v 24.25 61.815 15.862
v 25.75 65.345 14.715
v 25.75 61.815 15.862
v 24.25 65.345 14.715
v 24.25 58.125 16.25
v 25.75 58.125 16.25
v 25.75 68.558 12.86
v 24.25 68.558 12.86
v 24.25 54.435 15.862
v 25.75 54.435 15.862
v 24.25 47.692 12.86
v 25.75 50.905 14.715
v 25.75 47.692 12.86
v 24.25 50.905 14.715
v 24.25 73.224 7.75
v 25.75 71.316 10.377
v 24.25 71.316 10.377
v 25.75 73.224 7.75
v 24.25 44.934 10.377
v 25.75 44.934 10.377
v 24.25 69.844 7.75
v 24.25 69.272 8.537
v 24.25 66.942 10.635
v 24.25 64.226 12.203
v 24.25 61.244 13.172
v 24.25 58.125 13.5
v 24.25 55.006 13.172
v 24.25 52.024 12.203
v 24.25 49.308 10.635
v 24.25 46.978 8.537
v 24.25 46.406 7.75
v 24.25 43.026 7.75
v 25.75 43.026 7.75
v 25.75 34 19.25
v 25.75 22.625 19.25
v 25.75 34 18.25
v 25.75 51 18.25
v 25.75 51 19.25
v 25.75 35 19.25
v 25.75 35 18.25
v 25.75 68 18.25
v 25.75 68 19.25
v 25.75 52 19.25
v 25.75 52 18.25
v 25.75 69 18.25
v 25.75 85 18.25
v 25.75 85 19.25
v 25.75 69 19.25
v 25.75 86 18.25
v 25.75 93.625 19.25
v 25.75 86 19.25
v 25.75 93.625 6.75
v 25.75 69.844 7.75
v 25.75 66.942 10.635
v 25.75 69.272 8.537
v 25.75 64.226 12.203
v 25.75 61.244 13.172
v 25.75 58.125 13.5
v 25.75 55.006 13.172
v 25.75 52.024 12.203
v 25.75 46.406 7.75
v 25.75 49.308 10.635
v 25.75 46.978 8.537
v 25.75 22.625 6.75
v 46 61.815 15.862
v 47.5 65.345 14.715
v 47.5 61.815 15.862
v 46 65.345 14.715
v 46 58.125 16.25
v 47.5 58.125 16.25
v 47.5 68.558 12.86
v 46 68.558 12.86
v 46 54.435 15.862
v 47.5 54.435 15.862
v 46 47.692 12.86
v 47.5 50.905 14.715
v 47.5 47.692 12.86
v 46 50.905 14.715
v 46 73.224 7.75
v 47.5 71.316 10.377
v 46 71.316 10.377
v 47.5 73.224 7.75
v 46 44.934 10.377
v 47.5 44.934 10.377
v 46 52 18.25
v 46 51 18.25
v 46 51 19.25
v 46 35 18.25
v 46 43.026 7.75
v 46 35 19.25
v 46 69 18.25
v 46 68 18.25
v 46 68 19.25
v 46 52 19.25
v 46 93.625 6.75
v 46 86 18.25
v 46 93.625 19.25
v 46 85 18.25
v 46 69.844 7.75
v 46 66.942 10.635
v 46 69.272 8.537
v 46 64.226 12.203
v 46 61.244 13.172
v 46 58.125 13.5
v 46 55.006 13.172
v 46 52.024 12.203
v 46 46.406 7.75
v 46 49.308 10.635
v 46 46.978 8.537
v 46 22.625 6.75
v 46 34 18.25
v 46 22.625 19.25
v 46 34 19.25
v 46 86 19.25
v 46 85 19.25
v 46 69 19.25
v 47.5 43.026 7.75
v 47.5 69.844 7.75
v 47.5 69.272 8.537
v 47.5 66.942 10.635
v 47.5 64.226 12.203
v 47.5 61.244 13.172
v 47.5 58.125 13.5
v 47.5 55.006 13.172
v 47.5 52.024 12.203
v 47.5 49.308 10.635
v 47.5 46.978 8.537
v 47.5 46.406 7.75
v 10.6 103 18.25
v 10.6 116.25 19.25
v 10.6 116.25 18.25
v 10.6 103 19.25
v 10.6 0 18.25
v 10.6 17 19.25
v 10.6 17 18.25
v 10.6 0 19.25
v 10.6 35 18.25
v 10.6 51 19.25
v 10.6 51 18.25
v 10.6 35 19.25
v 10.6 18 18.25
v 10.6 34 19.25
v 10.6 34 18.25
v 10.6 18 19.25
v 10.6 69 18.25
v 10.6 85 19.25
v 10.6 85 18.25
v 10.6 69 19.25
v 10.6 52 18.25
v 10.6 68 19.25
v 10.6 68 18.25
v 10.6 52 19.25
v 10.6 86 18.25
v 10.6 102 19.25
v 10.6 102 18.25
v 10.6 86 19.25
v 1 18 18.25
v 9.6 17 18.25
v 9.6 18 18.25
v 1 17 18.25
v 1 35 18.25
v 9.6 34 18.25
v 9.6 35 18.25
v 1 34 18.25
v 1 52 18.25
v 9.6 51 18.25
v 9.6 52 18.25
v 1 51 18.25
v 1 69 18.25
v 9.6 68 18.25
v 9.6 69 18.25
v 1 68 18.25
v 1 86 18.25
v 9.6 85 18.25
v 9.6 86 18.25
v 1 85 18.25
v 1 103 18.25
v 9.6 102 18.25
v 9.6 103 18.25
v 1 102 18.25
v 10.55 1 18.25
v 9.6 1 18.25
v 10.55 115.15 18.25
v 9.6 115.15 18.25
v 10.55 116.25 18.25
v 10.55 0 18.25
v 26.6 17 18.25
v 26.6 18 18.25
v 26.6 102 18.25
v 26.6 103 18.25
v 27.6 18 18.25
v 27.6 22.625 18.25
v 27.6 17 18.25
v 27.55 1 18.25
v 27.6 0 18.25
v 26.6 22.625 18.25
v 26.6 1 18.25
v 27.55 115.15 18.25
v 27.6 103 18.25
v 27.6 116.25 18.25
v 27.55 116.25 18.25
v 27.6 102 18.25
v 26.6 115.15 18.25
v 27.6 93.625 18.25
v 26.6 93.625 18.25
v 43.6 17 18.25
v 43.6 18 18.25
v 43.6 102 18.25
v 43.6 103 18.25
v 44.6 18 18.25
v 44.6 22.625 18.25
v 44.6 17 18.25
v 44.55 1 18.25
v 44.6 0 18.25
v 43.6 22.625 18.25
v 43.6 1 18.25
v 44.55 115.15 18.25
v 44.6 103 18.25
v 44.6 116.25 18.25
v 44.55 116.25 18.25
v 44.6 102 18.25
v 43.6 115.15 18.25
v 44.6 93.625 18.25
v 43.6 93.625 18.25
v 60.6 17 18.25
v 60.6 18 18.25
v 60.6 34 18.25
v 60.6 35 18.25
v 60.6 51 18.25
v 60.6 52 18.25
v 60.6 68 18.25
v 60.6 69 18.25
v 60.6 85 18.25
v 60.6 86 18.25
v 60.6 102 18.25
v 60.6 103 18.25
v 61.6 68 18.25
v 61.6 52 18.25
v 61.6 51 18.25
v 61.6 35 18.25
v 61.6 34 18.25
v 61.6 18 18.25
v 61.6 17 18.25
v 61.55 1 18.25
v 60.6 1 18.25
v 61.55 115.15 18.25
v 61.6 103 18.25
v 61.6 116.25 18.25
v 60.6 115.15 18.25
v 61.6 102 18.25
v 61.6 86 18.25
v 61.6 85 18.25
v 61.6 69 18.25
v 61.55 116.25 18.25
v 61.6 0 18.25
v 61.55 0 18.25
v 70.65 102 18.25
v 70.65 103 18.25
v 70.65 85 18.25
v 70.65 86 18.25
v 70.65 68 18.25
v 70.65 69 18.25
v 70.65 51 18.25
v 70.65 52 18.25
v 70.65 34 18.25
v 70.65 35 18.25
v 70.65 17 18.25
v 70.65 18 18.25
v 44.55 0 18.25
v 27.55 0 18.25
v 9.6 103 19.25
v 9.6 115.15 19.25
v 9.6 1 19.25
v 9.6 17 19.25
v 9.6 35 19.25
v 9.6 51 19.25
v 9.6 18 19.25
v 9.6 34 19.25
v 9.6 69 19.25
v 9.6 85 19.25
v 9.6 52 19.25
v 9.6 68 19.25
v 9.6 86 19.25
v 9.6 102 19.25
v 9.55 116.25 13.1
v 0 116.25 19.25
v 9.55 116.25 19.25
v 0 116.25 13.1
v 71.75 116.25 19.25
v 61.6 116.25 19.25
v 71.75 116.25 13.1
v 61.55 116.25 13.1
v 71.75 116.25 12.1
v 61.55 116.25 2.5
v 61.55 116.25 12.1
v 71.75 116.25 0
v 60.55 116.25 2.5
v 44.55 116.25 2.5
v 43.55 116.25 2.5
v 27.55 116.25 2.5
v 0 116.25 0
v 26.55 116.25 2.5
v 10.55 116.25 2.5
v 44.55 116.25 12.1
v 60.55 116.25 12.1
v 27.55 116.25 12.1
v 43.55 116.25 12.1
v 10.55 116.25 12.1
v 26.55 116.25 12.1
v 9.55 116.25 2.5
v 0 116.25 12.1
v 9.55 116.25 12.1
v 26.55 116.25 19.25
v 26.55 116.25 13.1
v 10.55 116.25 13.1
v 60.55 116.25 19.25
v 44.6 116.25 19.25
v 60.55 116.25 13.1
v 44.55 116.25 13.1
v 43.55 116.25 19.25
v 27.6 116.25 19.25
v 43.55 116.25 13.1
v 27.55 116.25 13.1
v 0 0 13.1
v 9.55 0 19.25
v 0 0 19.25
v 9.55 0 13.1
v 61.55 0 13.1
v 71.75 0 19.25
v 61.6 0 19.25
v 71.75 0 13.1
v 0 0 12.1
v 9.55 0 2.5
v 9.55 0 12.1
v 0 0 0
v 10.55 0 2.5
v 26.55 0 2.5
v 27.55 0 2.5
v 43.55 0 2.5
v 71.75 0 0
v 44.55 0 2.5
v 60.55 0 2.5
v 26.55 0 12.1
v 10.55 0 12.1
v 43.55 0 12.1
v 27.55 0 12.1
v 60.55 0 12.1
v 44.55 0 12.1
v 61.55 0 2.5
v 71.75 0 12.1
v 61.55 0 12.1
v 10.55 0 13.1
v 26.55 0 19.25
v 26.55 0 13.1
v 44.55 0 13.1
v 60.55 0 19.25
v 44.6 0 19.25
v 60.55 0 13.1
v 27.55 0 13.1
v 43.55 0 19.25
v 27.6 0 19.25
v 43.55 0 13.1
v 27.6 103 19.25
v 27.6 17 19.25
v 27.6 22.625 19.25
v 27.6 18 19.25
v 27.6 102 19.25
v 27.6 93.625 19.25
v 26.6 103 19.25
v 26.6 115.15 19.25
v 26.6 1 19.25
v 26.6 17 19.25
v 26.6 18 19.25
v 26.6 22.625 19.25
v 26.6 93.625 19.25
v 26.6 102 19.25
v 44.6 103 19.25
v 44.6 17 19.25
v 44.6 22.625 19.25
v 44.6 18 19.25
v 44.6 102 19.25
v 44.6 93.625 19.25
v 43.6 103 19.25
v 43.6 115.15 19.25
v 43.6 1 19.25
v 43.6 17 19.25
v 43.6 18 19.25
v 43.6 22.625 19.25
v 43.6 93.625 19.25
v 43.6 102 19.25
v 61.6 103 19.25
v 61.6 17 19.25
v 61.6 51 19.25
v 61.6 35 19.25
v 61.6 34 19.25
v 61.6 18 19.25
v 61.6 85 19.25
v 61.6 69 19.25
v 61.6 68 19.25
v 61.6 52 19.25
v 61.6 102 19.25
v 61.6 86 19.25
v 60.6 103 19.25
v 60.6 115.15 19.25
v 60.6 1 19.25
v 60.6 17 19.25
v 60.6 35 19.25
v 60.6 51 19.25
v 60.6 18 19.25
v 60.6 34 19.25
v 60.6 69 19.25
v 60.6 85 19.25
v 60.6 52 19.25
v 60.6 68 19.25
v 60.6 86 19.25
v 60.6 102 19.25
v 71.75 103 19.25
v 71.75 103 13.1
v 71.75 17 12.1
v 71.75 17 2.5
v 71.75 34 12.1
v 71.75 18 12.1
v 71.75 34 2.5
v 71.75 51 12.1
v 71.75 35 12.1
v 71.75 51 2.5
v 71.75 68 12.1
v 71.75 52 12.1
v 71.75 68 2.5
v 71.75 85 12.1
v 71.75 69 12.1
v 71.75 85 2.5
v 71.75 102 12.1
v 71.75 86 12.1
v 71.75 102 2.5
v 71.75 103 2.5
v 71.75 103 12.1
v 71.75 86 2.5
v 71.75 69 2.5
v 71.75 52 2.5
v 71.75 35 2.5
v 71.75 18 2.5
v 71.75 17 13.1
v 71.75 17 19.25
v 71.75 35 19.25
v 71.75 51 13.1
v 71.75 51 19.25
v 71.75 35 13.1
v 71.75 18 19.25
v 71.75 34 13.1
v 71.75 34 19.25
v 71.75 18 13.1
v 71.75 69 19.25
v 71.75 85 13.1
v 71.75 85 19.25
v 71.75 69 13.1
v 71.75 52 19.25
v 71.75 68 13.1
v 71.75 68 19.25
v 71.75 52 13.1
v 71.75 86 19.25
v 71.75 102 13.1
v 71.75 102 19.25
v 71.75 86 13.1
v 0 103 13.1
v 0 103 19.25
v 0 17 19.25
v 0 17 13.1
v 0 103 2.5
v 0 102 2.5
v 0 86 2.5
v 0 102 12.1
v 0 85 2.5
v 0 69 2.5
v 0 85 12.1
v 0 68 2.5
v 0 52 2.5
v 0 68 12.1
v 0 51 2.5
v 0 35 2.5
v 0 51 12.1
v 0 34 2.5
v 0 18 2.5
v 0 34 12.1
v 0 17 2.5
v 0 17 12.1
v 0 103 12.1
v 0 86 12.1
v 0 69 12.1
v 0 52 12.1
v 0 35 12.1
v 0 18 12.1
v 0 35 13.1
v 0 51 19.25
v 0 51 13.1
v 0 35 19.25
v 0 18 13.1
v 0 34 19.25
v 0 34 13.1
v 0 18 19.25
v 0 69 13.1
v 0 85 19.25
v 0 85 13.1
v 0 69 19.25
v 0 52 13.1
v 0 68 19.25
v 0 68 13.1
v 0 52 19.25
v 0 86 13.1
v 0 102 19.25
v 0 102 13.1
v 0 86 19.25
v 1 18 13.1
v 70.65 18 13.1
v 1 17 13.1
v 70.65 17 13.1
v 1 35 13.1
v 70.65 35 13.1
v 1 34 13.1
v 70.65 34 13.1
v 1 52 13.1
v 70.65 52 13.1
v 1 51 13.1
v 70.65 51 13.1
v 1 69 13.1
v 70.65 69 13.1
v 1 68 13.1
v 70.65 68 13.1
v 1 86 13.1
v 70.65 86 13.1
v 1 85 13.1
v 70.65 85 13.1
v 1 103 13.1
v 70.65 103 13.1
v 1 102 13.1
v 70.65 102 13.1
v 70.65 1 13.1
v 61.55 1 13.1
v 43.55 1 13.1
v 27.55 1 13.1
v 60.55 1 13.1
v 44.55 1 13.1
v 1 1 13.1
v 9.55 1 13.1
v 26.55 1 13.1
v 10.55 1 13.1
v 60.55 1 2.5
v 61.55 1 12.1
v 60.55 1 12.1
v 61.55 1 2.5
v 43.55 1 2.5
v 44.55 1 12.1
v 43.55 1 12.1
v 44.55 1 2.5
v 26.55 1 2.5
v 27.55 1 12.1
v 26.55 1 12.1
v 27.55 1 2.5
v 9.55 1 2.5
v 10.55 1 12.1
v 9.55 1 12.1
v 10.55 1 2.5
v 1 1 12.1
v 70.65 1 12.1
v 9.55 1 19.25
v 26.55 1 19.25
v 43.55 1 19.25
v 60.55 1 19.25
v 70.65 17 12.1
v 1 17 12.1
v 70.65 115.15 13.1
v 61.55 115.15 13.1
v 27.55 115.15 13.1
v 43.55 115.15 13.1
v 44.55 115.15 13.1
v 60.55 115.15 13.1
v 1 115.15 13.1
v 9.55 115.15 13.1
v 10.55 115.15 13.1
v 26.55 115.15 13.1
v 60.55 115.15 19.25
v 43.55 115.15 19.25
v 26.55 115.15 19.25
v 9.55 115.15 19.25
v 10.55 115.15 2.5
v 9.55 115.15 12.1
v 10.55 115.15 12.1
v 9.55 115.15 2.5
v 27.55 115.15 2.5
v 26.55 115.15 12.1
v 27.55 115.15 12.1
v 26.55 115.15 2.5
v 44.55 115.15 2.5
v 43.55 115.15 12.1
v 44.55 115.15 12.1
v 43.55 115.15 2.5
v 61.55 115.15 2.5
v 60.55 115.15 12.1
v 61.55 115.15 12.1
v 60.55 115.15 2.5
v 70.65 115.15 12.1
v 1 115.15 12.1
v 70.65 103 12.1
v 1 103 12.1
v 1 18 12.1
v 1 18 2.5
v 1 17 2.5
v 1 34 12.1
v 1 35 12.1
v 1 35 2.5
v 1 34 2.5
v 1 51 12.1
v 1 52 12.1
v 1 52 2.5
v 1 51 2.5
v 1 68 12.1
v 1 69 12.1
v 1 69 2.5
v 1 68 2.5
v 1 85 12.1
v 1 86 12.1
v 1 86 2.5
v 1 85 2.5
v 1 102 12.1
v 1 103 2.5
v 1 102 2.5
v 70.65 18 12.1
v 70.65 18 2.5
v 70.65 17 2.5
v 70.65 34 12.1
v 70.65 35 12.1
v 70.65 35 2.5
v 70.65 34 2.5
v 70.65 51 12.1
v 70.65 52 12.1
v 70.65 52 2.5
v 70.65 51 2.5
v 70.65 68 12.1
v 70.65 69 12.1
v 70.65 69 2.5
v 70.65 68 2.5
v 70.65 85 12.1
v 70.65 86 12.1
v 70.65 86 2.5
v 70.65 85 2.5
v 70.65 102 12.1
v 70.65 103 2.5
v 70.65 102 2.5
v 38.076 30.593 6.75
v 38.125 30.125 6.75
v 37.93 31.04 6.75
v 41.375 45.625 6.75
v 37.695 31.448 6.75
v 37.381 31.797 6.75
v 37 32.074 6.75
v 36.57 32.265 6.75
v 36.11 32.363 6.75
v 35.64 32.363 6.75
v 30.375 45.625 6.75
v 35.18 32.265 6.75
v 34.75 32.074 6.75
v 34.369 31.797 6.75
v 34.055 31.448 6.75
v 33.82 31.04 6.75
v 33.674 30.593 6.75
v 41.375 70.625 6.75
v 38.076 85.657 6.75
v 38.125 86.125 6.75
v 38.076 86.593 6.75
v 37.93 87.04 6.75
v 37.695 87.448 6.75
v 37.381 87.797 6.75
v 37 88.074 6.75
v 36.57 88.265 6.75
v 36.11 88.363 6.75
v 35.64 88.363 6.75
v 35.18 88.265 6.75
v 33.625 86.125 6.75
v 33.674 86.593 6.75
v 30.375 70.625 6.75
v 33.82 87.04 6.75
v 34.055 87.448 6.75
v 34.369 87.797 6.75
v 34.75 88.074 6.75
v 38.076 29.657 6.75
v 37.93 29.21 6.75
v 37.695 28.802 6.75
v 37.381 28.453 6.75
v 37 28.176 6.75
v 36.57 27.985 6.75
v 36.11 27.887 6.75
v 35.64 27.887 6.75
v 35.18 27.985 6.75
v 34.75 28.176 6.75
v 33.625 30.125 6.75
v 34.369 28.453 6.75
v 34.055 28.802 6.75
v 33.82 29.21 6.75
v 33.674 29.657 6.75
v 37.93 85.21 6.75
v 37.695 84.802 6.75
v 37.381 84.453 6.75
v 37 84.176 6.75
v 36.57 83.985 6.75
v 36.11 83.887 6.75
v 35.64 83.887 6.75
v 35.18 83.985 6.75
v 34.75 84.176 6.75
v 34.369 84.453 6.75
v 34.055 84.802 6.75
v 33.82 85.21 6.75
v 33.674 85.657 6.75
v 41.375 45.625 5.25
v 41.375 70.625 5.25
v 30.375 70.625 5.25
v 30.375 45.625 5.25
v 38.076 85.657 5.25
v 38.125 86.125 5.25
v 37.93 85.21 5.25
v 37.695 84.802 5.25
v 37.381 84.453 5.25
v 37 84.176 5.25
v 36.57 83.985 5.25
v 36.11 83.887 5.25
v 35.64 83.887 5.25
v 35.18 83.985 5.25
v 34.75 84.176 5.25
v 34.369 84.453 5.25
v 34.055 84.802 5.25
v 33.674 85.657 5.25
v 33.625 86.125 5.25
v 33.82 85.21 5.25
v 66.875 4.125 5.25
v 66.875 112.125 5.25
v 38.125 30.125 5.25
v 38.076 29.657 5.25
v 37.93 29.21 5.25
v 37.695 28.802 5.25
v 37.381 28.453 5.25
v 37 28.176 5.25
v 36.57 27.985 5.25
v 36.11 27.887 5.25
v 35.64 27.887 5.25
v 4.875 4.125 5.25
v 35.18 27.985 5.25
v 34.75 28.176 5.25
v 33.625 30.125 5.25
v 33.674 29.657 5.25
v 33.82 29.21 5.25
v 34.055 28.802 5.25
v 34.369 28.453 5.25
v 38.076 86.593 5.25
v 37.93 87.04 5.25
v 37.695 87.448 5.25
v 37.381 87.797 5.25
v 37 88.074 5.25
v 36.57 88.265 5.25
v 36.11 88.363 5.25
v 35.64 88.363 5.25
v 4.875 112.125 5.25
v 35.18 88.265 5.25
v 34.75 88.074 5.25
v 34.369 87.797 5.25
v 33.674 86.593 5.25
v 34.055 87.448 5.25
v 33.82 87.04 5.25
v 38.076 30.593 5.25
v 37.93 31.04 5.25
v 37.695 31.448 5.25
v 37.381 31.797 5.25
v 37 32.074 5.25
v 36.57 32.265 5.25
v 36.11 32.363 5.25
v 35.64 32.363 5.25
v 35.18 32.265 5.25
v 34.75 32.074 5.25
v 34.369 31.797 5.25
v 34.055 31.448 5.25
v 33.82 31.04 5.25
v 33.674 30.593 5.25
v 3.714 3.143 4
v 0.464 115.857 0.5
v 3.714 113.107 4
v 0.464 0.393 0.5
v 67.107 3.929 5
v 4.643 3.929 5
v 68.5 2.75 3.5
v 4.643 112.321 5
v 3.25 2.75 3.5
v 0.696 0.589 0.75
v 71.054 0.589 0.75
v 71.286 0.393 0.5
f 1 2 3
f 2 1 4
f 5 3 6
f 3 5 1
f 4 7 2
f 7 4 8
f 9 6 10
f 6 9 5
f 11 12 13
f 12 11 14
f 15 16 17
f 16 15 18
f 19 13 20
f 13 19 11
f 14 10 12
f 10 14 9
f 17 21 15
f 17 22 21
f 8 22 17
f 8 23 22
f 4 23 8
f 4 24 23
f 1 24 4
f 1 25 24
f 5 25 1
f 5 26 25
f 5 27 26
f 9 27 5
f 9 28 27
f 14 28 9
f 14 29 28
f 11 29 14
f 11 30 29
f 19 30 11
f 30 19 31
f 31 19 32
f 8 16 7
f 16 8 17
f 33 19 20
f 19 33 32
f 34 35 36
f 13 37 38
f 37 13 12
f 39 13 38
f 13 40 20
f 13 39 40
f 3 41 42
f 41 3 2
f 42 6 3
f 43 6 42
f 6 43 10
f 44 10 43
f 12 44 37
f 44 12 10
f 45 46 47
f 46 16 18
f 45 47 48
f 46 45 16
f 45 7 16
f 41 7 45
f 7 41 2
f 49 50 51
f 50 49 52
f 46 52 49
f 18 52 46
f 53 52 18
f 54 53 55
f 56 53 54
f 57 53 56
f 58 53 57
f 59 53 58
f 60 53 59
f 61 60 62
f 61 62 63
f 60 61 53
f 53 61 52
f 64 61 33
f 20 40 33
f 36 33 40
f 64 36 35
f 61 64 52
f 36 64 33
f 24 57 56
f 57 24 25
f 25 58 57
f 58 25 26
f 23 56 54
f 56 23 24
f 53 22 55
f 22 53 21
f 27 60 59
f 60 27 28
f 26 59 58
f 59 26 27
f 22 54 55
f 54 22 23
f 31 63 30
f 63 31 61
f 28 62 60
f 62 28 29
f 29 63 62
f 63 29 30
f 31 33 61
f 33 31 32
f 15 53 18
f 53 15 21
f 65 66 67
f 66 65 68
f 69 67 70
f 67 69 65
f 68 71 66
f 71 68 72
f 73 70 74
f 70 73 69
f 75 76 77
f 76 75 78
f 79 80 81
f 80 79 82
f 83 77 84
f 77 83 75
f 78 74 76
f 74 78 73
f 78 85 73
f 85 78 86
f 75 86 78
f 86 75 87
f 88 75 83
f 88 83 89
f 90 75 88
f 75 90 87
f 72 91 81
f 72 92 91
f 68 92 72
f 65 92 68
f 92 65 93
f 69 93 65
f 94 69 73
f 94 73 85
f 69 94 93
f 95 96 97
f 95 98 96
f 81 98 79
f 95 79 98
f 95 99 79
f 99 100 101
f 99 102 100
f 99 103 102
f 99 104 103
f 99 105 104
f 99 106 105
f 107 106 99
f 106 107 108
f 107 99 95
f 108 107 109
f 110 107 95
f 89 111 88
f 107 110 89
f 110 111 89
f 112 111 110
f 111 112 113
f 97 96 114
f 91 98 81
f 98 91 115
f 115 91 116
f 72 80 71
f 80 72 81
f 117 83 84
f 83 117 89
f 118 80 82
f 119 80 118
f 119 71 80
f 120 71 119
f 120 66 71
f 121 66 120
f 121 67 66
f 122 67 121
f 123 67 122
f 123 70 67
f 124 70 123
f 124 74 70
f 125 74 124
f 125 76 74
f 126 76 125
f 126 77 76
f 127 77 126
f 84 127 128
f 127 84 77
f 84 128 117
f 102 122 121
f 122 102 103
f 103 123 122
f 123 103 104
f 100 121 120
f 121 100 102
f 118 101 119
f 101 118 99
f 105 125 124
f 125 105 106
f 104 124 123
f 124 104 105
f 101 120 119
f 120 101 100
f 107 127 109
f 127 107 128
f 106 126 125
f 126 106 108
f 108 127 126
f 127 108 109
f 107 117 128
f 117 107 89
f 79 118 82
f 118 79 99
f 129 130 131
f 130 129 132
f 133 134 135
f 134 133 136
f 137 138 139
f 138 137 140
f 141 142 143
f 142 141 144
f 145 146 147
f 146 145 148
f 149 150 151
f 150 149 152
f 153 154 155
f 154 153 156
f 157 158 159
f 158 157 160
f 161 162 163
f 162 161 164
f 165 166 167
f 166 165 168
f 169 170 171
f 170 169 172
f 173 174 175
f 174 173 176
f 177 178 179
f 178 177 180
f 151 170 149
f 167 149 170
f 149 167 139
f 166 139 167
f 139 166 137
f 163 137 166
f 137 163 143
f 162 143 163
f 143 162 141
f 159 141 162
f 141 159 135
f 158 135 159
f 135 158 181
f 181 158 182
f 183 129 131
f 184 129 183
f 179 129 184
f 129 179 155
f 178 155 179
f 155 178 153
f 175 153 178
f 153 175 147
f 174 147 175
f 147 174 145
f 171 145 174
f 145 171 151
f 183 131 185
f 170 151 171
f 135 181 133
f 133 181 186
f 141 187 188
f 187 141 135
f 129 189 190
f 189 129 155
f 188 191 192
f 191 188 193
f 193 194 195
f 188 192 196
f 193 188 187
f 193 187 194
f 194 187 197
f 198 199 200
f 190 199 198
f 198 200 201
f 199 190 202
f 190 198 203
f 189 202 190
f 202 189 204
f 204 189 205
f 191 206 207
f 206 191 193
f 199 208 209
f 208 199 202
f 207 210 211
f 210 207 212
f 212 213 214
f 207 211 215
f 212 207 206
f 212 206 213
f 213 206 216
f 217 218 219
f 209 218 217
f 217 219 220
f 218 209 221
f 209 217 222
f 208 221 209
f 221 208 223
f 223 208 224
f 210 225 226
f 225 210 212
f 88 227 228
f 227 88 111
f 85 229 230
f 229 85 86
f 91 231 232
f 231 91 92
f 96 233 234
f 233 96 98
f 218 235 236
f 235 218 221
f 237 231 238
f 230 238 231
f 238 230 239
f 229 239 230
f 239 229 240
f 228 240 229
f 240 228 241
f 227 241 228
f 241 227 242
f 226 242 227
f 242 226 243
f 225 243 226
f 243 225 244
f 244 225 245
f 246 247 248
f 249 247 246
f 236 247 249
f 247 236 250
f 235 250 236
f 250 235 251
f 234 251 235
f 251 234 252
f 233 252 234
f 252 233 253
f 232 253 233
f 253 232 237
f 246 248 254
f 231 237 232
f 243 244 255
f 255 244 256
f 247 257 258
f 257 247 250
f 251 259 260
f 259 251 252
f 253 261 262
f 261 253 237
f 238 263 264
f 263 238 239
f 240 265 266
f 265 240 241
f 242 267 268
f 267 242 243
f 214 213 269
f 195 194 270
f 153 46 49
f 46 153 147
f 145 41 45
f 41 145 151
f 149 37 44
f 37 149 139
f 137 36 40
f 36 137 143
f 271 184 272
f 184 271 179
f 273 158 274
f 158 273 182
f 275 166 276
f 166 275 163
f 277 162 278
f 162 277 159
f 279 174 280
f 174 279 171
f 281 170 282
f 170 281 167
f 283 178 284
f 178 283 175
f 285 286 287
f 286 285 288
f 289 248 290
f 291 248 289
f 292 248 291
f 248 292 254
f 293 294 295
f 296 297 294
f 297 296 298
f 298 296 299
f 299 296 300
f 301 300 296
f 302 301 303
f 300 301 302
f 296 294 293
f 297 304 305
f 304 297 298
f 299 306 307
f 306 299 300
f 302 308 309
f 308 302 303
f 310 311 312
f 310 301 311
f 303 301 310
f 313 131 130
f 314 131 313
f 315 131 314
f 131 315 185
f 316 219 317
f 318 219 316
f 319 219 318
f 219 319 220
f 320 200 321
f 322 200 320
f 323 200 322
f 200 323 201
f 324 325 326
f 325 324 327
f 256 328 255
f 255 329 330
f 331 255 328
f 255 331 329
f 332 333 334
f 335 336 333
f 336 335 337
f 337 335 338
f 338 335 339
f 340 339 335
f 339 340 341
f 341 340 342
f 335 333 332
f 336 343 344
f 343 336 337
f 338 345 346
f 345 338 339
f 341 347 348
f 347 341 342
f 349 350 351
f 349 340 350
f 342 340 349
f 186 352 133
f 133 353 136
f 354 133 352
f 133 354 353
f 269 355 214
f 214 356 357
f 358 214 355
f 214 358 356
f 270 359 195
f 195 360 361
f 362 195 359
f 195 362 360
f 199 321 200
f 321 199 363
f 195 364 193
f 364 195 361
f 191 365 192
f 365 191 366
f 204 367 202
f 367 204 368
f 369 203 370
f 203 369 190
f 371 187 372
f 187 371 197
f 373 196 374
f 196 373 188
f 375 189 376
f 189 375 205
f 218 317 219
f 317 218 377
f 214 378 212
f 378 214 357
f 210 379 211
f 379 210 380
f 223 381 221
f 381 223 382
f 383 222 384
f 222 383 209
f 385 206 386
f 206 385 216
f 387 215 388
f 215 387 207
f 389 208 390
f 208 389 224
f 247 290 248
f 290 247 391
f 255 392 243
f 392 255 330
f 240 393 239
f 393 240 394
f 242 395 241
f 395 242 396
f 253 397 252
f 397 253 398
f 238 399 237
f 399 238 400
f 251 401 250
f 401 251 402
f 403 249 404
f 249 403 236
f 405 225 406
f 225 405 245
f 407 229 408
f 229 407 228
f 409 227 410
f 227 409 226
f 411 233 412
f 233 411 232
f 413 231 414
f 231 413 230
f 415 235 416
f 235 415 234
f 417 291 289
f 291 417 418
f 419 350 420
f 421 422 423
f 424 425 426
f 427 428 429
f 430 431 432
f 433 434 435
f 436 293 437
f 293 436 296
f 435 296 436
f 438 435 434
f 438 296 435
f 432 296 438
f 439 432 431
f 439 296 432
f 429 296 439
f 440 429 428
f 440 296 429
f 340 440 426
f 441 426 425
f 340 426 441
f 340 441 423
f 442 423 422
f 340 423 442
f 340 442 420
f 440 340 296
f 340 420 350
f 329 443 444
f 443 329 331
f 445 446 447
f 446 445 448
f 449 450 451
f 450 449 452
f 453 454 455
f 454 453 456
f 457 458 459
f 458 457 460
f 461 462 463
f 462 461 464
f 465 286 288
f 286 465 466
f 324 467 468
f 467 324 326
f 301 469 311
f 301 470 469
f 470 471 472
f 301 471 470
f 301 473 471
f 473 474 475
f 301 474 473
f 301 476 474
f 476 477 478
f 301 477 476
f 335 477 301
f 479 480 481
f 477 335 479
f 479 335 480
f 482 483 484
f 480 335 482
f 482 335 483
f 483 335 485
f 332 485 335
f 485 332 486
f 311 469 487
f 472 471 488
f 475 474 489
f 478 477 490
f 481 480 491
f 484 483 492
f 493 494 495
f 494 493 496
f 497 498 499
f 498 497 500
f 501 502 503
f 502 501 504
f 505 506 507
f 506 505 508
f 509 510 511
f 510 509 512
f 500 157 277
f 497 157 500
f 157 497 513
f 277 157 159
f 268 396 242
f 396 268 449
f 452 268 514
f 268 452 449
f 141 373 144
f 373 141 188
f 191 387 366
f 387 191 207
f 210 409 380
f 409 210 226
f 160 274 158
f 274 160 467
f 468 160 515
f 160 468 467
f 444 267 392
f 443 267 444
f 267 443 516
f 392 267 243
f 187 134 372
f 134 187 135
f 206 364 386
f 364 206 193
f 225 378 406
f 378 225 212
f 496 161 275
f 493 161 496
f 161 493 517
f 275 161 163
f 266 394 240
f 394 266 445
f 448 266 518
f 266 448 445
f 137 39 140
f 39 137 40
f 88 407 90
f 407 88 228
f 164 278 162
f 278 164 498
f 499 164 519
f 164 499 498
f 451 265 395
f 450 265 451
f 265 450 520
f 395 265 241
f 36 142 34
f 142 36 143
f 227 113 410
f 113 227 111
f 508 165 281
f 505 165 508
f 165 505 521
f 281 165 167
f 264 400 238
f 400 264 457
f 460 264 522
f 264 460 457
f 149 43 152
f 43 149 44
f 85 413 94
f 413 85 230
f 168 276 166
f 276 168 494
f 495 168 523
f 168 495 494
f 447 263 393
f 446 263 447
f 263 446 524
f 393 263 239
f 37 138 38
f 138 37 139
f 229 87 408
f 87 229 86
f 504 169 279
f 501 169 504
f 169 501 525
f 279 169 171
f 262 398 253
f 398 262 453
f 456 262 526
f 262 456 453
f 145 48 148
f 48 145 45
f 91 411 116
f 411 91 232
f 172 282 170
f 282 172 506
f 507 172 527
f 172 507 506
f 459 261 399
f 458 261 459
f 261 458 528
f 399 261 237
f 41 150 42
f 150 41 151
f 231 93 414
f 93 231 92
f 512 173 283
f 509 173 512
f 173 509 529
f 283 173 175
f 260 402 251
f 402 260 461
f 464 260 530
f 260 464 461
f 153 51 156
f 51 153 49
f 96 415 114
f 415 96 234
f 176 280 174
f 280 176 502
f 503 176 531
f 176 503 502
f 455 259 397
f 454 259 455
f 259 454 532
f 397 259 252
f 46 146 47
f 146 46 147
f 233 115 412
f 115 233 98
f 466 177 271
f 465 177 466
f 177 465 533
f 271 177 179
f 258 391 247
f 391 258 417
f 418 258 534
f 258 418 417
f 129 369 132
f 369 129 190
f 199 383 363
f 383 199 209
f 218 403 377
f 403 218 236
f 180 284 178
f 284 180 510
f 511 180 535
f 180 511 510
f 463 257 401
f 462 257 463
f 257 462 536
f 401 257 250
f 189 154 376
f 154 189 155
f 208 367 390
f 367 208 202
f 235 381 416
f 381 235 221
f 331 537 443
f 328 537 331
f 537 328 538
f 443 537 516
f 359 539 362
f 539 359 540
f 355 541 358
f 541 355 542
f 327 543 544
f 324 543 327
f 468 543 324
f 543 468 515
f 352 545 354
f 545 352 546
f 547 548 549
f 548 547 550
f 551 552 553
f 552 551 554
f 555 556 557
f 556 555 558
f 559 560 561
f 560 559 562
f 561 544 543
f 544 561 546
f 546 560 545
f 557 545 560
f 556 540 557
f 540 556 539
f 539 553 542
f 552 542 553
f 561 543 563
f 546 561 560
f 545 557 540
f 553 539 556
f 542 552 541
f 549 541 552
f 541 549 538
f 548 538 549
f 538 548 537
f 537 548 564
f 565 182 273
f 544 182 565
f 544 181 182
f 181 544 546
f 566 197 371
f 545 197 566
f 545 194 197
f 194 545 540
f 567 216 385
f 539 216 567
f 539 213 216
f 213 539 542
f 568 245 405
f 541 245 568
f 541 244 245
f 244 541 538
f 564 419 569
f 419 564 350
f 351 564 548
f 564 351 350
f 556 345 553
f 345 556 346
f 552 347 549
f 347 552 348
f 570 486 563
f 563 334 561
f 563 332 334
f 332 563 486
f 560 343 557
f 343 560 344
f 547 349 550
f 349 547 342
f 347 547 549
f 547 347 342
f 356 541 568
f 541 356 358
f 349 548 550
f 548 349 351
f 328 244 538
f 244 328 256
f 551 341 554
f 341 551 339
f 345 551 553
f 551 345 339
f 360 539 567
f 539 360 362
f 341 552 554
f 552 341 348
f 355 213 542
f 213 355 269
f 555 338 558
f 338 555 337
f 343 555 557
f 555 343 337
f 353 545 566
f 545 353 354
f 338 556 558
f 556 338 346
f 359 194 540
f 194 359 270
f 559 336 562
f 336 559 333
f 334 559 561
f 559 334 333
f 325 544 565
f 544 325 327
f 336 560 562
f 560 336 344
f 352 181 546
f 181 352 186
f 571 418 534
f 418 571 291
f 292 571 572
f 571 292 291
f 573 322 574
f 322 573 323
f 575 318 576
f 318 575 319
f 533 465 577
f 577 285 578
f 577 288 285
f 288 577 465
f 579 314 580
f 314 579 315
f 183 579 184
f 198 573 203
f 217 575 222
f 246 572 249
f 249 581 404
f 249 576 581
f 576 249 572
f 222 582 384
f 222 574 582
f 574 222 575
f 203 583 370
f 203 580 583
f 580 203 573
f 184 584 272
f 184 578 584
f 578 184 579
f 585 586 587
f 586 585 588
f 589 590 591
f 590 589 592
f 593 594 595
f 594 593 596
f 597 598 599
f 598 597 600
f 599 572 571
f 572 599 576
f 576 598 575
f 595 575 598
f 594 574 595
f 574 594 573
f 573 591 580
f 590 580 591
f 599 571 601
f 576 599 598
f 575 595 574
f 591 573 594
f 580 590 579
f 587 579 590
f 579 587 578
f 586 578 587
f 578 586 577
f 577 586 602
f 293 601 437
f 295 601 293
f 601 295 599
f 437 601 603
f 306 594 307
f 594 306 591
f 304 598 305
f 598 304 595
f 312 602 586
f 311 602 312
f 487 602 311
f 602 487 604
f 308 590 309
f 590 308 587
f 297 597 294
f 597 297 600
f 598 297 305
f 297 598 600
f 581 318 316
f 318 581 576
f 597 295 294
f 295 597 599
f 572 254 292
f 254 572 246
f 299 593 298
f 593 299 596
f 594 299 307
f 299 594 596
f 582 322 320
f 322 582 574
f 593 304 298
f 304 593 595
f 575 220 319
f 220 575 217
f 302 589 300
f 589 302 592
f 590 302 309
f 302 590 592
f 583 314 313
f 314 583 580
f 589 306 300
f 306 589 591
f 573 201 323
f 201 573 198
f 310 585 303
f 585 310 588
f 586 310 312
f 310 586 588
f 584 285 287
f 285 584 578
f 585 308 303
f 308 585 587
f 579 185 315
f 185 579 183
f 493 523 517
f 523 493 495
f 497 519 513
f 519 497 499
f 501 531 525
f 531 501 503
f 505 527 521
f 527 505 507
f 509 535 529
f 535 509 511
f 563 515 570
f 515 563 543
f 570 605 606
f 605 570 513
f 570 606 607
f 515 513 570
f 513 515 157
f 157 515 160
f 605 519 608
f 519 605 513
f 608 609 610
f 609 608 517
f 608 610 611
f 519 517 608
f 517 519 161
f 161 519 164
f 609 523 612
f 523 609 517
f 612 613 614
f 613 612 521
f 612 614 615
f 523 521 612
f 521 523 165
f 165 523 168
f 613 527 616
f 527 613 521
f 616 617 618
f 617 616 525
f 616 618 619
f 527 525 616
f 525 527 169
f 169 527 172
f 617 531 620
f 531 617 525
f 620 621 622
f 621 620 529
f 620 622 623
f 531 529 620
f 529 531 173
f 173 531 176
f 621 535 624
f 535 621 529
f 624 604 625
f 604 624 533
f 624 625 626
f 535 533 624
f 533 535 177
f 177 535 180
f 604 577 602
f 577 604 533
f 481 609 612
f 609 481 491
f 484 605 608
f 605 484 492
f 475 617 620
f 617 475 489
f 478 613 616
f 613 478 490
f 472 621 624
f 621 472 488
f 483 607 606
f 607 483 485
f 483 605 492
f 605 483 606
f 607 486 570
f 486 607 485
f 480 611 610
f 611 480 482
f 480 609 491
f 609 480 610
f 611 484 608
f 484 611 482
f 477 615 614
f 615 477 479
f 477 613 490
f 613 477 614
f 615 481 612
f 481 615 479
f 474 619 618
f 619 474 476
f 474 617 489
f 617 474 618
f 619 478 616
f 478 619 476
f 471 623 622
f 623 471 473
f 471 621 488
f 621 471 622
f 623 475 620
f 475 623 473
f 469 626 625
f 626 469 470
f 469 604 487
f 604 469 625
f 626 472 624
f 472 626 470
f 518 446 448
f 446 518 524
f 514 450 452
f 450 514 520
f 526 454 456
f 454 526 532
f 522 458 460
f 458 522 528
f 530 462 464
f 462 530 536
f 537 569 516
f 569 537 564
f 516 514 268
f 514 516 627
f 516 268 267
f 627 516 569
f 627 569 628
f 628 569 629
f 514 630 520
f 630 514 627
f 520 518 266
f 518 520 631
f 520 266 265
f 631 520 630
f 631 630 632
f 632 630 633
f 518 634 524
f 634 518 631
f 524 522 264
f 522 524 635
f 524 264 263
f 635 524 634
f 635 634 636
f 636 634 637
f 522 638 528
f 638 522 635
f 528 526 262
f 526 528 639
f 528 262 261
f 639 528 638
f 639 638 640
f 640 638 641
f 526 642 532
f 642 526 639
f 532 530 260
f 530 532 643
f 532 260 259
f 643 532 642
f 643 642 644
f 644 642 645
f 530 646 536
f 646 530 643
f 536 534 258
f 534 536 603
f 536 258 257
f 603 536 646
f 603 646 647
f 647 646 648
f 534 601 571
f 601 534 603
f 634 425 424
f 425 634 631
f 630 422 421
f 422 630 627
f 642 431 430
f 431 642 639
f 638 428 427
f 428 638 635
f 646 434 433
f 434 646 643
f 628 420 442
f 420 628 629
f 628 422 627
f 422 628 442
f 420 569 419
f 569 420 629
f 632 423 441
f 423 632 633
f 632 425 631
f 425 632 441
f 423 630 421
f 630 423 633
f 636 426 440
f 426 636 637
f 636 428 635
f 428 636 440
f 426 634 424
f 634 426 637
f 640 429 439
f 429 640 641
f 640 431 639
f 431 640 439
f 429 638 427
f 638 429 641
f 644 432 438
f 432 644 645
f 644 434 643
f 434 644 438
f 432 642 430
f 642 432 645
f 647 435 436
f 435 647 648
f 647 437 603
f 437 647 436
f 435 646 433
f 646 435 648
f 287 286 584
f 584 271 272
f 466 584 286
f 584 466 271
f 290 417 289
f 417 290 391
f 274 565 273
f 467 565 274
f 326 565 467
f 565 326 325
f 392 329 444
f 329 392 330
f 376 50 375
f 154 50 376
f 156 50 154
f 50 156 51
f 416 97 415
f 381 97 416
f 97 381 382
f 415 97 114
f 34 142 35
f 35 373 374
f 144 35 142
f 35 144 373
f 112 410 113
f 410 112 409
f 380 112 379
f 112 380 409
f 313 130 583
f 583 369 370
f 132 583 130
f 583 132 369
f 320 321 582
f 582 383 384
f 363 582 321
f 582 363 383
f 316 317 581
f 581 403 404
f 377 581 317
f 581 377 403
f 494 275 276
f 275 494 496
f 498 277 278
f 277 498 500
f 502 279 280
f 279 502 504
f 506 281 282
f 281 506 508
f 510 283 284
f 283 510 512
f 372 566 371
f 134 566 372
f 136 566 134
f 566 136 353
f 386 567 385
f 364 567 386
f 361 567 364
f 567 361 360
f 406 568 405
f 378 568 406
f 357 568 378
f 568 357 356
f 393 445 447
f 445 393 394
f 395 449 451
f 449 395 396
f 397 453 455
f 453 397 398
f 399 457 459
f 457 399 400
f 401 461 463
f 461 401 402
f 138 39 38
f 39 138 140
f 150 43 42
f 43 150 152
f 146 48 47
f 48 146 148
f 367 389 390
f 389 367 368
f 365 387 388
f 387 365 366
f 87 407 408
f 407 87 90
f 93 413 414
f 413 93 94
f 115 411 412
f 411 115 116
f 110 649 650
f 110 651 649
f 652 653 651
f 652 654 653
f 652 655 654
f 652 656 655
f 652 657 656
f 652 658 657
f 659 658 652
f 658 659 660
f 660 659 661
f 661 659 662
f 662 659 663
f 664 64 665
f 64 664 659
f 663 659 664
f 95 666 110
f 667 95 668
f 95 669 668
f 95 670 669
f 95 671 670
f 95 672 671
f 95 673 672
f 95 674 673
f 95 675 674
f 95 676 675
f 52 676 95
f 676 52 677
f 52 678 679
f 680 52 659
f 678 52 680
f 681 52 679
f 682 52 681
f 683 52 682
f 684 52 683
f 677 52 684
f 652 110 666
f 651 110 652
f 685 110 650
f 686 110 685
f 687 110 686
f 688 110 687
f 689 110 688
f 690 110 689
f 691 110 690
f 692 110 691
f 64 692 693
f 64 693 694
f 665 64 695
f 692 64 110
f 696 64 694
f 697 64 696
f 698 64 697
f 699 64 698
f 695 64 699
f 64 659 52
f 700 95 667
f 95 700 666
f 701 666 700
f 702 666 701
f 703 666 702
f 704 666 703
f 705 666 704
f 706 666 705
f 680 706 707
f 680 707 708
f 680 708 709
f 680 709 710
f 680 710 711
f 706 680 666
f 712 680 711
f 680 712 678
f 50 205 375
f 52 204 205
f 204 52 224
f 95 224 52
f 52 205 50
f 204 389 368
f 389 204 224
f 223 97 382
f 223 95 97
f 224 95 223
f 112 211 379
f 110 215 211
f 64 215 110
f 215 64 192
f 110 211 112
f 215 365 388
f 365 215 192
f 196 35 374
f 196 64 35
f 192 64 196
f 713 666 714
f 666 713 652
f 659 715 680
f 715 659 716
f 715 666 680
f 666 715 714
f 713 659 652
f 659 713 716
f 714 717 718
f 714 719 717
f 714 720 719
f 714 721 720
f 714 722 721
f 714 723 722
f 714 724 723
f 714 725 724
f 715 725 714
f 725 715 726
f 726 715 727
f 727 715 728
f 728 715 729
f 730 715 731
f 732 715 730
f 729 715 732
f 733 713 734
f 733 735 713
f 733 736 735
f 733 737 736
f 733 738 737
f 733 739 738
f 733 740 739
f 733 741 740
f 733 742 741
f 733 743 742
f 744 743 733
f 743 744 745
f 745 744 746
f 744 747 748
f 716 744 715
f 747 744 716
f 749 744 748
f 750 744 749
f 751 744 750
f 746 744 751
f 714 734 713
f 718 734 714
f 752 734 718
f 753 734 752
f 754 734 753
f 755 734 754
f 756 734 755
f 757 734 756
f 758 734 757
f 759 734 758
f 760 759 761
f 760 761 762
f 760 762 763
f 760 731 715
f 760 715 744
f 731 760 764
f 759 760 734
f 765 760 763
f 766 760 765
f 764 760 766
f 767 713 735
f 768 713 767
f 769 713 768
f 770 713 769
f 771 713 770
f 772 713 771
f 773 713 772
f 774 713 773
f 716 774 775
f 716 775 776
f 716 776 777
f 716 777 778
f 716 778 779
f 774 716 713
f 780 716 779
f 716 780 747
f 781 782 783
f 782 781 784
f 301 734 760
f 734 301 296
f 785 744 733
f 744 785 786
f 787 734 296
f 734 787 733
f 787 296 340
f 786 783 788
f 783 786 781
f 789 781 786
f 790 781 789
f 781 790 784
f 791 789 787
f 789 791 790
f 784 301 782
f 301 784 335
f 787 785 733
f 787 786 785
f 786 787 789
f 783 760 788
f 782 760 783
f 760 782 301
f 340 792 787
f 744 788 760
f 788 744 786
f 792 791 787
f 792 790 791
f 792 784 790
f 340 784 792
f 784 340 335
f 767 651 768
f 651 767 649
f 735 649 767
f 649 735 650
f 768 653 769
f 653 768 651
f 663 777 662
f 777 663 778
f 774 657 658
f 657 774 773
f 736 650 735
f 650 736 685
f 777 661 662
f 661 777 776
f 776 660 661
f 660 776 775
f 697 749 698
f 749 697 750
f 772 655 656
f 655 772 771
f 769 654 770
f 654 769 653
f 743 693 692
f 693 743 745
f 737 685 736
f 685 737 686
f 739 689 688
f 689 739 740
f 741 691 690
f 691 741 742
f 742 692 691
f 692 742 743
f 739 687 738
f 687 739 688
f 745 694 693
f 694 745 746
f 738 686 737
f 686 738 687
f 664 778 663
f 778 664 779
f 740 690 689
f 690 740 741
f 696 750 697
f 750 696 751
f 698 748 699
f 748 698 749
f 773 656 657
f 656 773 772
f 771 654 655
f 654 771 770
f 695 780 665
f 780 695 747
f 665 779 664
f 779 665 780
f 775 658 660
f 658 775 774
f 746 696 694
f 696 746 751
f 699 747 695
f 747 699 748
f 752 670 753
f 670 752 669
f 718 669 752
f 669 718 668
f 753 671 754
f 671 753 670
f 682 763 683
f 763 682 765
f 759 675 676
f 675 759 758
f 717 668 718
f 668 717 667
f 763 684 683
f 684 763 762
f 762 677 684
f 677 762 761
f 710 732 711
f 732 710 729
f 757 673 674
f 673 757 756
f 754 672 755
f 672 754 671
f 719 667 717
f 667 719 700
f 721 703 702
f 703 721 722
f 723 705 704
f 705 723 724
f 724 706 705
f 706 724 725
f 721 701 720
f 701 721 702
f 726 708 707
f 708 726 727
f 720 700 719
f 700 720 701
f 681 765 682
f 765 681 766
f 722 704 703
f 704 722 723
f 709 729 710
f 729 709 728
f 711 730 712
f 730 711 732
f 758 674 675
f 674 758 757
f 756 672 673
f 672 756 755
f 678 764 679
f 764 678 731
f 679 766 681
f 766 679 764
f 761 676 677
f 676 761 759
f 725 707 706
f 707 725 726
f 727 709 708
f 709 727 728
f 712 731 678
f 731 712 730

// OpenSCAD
$fs = 0.4;

cover_width = 71.75;
cover_height = 116.25;
cover_depth = 19.25;

inset_width = 20.25;
inset_height = 71;
inset_depth = 12.5;

switch_width = 11;
switch_height = 25;

plate_width = 62;
plate_height = 108;
plate_depth = 5.25;

hole_diameter = 4.5;
hole_to_switch = 15.5;

brick_size = 16;
mortar_size = 1;
brick_x_offset = 9.6;
brick_z_offset = -3;

slot_length = 37;
slot_width = 5.5;
slot_depth = 1.5;
slot_source_diameter = 30;
slot_from_top = 3;
slot_from_bottom = 1;

module hole() {
    translate([
        cover_width / 2, 
        ((cover_height - switch_height) / 2) - hole_to_switch, 
        0
    ])
        cylinder(cover_depth, hole_diameter / 2, hole_diameter / 2);
}

module slot() {
    slot_radius = (slot_width + slot_source_diameter) / 2;
    slot_bounds_height = (inset_depth - slot_from_top - slot_from_bottom);

    translate([
        (cover_width - inset_width) / 2, 
        (cover_height - 2 * slot_radius) / 2, 
        -slot_radius + slot_bounds_height + cover_depth 
            - inset_depth + slot_from_bottom
    ]) {
        rotate([0, -90, 0]) {
            difference() {
                translate([0, slot_radius, 0]) {
                    difference() {
                        cylinder(
                            slot_depth, 
                            d = slot_radius * 2,
                            center = false
                        );
                        cylinder(slot_depth, d = slot_source_diameter);
                    }
                }
                
                translate([-slot_radius, 0, 0])
                    cube([
                            2 * slot_radius - slot_bounds_height, 
                            slot_radius * 2,
                            slot_radius * 2
                    ]);    
            }
        }
    }
}

module brick_lines() {
    translate([brick_x_offset, 0, 0]) {
        cols = floor(cover_width / (brick_size + mortar_size));
        
        for (i = [0 : 3]) {
            translate([i * (brick_size + mortar_size), 0, 0])
                cube([mortar_size, cover_height, mortar_size + .1]);
        }
    }
        
    rows = floor(cover_height / (brick_size + mortar_size));
    
    for (i = [1 : rows]) {
        translate([0, i * (brick_size + mortar_size), 0])
            cube([cover_width, mortar_size, mortar_size + .1]);
    }
}

color("grey") {
    difference() {
        cube([cover_width, cover_height, cover_depth]);
        
        translate([
            (cover_width - inset_width) / 2, 
            (cover_height - inset_height) / 2, 
            cover_depth - inset_depth
        ])
            cube([inset_width, inset_height, inset_depth]);
        
        translate([
            (cover_width - switch_width) / 2, 
            (cover_height - switch_height) / 2, 
            0
        ])
            cube([switch_width, switch_height, cover_depth]);
            
        translate([cover_width / 2, cover_height / 2])
            linear_extrude(
                height = plate_depth,
                scale = [
                    plate_width / cover_width,
                    plate_height / cover_height
                ]
            )
                square([cover_width, cover_height], center = true);

        hole();
            
        translate([0, 2 * hole_to_switch + switch_height, 0]) hole();

        slot();
        translate([inset_width + slot_depth, 0, 0]) slot();

        translate([0, 0, cover_depth - mortar_size]) brick_lines();


    // These seem more logical, but don't z-offset consistent with the original
    //    translate([0, mortar_size, (-brick_size / 2) - brick_z_offset]) 
    //        rotate([90, 0, 0]) brick_lines();   
    //
    //    translate([0, cover_height, (-brick_size / 2) - brick_z_offset]) 
    //        rotate([90, 0, 0]) brick_lines();
    // 

        translate([
            2 * mortar_size + cover_width + brick_x_offset / 2, 
            mortar_size, 
            (-mortar_size / 2) - brick_z_offset
        ]) 
            rotate([0, -90, 90]) brick_lines();   

        translate([
            2 * mortar_size + cover_width + brick_x_offset / 2, 
            cover_height, 
            (-mortar_size / 2) - brick_z_offset
        ]) 
            rotate([0, -90, 90]) brick_lines();   

        translate([mortar_size, 0, (-mortar_size / 2) - brick_z_offset]) 
            rotate([0, -90, 0]) brick_lines();   

        translate([cover_width, 0, (-mortar_size / 2) - brick_z_offset]) 
            rotate([0, -90, 0]) brick_lines();       
    }
}

        
